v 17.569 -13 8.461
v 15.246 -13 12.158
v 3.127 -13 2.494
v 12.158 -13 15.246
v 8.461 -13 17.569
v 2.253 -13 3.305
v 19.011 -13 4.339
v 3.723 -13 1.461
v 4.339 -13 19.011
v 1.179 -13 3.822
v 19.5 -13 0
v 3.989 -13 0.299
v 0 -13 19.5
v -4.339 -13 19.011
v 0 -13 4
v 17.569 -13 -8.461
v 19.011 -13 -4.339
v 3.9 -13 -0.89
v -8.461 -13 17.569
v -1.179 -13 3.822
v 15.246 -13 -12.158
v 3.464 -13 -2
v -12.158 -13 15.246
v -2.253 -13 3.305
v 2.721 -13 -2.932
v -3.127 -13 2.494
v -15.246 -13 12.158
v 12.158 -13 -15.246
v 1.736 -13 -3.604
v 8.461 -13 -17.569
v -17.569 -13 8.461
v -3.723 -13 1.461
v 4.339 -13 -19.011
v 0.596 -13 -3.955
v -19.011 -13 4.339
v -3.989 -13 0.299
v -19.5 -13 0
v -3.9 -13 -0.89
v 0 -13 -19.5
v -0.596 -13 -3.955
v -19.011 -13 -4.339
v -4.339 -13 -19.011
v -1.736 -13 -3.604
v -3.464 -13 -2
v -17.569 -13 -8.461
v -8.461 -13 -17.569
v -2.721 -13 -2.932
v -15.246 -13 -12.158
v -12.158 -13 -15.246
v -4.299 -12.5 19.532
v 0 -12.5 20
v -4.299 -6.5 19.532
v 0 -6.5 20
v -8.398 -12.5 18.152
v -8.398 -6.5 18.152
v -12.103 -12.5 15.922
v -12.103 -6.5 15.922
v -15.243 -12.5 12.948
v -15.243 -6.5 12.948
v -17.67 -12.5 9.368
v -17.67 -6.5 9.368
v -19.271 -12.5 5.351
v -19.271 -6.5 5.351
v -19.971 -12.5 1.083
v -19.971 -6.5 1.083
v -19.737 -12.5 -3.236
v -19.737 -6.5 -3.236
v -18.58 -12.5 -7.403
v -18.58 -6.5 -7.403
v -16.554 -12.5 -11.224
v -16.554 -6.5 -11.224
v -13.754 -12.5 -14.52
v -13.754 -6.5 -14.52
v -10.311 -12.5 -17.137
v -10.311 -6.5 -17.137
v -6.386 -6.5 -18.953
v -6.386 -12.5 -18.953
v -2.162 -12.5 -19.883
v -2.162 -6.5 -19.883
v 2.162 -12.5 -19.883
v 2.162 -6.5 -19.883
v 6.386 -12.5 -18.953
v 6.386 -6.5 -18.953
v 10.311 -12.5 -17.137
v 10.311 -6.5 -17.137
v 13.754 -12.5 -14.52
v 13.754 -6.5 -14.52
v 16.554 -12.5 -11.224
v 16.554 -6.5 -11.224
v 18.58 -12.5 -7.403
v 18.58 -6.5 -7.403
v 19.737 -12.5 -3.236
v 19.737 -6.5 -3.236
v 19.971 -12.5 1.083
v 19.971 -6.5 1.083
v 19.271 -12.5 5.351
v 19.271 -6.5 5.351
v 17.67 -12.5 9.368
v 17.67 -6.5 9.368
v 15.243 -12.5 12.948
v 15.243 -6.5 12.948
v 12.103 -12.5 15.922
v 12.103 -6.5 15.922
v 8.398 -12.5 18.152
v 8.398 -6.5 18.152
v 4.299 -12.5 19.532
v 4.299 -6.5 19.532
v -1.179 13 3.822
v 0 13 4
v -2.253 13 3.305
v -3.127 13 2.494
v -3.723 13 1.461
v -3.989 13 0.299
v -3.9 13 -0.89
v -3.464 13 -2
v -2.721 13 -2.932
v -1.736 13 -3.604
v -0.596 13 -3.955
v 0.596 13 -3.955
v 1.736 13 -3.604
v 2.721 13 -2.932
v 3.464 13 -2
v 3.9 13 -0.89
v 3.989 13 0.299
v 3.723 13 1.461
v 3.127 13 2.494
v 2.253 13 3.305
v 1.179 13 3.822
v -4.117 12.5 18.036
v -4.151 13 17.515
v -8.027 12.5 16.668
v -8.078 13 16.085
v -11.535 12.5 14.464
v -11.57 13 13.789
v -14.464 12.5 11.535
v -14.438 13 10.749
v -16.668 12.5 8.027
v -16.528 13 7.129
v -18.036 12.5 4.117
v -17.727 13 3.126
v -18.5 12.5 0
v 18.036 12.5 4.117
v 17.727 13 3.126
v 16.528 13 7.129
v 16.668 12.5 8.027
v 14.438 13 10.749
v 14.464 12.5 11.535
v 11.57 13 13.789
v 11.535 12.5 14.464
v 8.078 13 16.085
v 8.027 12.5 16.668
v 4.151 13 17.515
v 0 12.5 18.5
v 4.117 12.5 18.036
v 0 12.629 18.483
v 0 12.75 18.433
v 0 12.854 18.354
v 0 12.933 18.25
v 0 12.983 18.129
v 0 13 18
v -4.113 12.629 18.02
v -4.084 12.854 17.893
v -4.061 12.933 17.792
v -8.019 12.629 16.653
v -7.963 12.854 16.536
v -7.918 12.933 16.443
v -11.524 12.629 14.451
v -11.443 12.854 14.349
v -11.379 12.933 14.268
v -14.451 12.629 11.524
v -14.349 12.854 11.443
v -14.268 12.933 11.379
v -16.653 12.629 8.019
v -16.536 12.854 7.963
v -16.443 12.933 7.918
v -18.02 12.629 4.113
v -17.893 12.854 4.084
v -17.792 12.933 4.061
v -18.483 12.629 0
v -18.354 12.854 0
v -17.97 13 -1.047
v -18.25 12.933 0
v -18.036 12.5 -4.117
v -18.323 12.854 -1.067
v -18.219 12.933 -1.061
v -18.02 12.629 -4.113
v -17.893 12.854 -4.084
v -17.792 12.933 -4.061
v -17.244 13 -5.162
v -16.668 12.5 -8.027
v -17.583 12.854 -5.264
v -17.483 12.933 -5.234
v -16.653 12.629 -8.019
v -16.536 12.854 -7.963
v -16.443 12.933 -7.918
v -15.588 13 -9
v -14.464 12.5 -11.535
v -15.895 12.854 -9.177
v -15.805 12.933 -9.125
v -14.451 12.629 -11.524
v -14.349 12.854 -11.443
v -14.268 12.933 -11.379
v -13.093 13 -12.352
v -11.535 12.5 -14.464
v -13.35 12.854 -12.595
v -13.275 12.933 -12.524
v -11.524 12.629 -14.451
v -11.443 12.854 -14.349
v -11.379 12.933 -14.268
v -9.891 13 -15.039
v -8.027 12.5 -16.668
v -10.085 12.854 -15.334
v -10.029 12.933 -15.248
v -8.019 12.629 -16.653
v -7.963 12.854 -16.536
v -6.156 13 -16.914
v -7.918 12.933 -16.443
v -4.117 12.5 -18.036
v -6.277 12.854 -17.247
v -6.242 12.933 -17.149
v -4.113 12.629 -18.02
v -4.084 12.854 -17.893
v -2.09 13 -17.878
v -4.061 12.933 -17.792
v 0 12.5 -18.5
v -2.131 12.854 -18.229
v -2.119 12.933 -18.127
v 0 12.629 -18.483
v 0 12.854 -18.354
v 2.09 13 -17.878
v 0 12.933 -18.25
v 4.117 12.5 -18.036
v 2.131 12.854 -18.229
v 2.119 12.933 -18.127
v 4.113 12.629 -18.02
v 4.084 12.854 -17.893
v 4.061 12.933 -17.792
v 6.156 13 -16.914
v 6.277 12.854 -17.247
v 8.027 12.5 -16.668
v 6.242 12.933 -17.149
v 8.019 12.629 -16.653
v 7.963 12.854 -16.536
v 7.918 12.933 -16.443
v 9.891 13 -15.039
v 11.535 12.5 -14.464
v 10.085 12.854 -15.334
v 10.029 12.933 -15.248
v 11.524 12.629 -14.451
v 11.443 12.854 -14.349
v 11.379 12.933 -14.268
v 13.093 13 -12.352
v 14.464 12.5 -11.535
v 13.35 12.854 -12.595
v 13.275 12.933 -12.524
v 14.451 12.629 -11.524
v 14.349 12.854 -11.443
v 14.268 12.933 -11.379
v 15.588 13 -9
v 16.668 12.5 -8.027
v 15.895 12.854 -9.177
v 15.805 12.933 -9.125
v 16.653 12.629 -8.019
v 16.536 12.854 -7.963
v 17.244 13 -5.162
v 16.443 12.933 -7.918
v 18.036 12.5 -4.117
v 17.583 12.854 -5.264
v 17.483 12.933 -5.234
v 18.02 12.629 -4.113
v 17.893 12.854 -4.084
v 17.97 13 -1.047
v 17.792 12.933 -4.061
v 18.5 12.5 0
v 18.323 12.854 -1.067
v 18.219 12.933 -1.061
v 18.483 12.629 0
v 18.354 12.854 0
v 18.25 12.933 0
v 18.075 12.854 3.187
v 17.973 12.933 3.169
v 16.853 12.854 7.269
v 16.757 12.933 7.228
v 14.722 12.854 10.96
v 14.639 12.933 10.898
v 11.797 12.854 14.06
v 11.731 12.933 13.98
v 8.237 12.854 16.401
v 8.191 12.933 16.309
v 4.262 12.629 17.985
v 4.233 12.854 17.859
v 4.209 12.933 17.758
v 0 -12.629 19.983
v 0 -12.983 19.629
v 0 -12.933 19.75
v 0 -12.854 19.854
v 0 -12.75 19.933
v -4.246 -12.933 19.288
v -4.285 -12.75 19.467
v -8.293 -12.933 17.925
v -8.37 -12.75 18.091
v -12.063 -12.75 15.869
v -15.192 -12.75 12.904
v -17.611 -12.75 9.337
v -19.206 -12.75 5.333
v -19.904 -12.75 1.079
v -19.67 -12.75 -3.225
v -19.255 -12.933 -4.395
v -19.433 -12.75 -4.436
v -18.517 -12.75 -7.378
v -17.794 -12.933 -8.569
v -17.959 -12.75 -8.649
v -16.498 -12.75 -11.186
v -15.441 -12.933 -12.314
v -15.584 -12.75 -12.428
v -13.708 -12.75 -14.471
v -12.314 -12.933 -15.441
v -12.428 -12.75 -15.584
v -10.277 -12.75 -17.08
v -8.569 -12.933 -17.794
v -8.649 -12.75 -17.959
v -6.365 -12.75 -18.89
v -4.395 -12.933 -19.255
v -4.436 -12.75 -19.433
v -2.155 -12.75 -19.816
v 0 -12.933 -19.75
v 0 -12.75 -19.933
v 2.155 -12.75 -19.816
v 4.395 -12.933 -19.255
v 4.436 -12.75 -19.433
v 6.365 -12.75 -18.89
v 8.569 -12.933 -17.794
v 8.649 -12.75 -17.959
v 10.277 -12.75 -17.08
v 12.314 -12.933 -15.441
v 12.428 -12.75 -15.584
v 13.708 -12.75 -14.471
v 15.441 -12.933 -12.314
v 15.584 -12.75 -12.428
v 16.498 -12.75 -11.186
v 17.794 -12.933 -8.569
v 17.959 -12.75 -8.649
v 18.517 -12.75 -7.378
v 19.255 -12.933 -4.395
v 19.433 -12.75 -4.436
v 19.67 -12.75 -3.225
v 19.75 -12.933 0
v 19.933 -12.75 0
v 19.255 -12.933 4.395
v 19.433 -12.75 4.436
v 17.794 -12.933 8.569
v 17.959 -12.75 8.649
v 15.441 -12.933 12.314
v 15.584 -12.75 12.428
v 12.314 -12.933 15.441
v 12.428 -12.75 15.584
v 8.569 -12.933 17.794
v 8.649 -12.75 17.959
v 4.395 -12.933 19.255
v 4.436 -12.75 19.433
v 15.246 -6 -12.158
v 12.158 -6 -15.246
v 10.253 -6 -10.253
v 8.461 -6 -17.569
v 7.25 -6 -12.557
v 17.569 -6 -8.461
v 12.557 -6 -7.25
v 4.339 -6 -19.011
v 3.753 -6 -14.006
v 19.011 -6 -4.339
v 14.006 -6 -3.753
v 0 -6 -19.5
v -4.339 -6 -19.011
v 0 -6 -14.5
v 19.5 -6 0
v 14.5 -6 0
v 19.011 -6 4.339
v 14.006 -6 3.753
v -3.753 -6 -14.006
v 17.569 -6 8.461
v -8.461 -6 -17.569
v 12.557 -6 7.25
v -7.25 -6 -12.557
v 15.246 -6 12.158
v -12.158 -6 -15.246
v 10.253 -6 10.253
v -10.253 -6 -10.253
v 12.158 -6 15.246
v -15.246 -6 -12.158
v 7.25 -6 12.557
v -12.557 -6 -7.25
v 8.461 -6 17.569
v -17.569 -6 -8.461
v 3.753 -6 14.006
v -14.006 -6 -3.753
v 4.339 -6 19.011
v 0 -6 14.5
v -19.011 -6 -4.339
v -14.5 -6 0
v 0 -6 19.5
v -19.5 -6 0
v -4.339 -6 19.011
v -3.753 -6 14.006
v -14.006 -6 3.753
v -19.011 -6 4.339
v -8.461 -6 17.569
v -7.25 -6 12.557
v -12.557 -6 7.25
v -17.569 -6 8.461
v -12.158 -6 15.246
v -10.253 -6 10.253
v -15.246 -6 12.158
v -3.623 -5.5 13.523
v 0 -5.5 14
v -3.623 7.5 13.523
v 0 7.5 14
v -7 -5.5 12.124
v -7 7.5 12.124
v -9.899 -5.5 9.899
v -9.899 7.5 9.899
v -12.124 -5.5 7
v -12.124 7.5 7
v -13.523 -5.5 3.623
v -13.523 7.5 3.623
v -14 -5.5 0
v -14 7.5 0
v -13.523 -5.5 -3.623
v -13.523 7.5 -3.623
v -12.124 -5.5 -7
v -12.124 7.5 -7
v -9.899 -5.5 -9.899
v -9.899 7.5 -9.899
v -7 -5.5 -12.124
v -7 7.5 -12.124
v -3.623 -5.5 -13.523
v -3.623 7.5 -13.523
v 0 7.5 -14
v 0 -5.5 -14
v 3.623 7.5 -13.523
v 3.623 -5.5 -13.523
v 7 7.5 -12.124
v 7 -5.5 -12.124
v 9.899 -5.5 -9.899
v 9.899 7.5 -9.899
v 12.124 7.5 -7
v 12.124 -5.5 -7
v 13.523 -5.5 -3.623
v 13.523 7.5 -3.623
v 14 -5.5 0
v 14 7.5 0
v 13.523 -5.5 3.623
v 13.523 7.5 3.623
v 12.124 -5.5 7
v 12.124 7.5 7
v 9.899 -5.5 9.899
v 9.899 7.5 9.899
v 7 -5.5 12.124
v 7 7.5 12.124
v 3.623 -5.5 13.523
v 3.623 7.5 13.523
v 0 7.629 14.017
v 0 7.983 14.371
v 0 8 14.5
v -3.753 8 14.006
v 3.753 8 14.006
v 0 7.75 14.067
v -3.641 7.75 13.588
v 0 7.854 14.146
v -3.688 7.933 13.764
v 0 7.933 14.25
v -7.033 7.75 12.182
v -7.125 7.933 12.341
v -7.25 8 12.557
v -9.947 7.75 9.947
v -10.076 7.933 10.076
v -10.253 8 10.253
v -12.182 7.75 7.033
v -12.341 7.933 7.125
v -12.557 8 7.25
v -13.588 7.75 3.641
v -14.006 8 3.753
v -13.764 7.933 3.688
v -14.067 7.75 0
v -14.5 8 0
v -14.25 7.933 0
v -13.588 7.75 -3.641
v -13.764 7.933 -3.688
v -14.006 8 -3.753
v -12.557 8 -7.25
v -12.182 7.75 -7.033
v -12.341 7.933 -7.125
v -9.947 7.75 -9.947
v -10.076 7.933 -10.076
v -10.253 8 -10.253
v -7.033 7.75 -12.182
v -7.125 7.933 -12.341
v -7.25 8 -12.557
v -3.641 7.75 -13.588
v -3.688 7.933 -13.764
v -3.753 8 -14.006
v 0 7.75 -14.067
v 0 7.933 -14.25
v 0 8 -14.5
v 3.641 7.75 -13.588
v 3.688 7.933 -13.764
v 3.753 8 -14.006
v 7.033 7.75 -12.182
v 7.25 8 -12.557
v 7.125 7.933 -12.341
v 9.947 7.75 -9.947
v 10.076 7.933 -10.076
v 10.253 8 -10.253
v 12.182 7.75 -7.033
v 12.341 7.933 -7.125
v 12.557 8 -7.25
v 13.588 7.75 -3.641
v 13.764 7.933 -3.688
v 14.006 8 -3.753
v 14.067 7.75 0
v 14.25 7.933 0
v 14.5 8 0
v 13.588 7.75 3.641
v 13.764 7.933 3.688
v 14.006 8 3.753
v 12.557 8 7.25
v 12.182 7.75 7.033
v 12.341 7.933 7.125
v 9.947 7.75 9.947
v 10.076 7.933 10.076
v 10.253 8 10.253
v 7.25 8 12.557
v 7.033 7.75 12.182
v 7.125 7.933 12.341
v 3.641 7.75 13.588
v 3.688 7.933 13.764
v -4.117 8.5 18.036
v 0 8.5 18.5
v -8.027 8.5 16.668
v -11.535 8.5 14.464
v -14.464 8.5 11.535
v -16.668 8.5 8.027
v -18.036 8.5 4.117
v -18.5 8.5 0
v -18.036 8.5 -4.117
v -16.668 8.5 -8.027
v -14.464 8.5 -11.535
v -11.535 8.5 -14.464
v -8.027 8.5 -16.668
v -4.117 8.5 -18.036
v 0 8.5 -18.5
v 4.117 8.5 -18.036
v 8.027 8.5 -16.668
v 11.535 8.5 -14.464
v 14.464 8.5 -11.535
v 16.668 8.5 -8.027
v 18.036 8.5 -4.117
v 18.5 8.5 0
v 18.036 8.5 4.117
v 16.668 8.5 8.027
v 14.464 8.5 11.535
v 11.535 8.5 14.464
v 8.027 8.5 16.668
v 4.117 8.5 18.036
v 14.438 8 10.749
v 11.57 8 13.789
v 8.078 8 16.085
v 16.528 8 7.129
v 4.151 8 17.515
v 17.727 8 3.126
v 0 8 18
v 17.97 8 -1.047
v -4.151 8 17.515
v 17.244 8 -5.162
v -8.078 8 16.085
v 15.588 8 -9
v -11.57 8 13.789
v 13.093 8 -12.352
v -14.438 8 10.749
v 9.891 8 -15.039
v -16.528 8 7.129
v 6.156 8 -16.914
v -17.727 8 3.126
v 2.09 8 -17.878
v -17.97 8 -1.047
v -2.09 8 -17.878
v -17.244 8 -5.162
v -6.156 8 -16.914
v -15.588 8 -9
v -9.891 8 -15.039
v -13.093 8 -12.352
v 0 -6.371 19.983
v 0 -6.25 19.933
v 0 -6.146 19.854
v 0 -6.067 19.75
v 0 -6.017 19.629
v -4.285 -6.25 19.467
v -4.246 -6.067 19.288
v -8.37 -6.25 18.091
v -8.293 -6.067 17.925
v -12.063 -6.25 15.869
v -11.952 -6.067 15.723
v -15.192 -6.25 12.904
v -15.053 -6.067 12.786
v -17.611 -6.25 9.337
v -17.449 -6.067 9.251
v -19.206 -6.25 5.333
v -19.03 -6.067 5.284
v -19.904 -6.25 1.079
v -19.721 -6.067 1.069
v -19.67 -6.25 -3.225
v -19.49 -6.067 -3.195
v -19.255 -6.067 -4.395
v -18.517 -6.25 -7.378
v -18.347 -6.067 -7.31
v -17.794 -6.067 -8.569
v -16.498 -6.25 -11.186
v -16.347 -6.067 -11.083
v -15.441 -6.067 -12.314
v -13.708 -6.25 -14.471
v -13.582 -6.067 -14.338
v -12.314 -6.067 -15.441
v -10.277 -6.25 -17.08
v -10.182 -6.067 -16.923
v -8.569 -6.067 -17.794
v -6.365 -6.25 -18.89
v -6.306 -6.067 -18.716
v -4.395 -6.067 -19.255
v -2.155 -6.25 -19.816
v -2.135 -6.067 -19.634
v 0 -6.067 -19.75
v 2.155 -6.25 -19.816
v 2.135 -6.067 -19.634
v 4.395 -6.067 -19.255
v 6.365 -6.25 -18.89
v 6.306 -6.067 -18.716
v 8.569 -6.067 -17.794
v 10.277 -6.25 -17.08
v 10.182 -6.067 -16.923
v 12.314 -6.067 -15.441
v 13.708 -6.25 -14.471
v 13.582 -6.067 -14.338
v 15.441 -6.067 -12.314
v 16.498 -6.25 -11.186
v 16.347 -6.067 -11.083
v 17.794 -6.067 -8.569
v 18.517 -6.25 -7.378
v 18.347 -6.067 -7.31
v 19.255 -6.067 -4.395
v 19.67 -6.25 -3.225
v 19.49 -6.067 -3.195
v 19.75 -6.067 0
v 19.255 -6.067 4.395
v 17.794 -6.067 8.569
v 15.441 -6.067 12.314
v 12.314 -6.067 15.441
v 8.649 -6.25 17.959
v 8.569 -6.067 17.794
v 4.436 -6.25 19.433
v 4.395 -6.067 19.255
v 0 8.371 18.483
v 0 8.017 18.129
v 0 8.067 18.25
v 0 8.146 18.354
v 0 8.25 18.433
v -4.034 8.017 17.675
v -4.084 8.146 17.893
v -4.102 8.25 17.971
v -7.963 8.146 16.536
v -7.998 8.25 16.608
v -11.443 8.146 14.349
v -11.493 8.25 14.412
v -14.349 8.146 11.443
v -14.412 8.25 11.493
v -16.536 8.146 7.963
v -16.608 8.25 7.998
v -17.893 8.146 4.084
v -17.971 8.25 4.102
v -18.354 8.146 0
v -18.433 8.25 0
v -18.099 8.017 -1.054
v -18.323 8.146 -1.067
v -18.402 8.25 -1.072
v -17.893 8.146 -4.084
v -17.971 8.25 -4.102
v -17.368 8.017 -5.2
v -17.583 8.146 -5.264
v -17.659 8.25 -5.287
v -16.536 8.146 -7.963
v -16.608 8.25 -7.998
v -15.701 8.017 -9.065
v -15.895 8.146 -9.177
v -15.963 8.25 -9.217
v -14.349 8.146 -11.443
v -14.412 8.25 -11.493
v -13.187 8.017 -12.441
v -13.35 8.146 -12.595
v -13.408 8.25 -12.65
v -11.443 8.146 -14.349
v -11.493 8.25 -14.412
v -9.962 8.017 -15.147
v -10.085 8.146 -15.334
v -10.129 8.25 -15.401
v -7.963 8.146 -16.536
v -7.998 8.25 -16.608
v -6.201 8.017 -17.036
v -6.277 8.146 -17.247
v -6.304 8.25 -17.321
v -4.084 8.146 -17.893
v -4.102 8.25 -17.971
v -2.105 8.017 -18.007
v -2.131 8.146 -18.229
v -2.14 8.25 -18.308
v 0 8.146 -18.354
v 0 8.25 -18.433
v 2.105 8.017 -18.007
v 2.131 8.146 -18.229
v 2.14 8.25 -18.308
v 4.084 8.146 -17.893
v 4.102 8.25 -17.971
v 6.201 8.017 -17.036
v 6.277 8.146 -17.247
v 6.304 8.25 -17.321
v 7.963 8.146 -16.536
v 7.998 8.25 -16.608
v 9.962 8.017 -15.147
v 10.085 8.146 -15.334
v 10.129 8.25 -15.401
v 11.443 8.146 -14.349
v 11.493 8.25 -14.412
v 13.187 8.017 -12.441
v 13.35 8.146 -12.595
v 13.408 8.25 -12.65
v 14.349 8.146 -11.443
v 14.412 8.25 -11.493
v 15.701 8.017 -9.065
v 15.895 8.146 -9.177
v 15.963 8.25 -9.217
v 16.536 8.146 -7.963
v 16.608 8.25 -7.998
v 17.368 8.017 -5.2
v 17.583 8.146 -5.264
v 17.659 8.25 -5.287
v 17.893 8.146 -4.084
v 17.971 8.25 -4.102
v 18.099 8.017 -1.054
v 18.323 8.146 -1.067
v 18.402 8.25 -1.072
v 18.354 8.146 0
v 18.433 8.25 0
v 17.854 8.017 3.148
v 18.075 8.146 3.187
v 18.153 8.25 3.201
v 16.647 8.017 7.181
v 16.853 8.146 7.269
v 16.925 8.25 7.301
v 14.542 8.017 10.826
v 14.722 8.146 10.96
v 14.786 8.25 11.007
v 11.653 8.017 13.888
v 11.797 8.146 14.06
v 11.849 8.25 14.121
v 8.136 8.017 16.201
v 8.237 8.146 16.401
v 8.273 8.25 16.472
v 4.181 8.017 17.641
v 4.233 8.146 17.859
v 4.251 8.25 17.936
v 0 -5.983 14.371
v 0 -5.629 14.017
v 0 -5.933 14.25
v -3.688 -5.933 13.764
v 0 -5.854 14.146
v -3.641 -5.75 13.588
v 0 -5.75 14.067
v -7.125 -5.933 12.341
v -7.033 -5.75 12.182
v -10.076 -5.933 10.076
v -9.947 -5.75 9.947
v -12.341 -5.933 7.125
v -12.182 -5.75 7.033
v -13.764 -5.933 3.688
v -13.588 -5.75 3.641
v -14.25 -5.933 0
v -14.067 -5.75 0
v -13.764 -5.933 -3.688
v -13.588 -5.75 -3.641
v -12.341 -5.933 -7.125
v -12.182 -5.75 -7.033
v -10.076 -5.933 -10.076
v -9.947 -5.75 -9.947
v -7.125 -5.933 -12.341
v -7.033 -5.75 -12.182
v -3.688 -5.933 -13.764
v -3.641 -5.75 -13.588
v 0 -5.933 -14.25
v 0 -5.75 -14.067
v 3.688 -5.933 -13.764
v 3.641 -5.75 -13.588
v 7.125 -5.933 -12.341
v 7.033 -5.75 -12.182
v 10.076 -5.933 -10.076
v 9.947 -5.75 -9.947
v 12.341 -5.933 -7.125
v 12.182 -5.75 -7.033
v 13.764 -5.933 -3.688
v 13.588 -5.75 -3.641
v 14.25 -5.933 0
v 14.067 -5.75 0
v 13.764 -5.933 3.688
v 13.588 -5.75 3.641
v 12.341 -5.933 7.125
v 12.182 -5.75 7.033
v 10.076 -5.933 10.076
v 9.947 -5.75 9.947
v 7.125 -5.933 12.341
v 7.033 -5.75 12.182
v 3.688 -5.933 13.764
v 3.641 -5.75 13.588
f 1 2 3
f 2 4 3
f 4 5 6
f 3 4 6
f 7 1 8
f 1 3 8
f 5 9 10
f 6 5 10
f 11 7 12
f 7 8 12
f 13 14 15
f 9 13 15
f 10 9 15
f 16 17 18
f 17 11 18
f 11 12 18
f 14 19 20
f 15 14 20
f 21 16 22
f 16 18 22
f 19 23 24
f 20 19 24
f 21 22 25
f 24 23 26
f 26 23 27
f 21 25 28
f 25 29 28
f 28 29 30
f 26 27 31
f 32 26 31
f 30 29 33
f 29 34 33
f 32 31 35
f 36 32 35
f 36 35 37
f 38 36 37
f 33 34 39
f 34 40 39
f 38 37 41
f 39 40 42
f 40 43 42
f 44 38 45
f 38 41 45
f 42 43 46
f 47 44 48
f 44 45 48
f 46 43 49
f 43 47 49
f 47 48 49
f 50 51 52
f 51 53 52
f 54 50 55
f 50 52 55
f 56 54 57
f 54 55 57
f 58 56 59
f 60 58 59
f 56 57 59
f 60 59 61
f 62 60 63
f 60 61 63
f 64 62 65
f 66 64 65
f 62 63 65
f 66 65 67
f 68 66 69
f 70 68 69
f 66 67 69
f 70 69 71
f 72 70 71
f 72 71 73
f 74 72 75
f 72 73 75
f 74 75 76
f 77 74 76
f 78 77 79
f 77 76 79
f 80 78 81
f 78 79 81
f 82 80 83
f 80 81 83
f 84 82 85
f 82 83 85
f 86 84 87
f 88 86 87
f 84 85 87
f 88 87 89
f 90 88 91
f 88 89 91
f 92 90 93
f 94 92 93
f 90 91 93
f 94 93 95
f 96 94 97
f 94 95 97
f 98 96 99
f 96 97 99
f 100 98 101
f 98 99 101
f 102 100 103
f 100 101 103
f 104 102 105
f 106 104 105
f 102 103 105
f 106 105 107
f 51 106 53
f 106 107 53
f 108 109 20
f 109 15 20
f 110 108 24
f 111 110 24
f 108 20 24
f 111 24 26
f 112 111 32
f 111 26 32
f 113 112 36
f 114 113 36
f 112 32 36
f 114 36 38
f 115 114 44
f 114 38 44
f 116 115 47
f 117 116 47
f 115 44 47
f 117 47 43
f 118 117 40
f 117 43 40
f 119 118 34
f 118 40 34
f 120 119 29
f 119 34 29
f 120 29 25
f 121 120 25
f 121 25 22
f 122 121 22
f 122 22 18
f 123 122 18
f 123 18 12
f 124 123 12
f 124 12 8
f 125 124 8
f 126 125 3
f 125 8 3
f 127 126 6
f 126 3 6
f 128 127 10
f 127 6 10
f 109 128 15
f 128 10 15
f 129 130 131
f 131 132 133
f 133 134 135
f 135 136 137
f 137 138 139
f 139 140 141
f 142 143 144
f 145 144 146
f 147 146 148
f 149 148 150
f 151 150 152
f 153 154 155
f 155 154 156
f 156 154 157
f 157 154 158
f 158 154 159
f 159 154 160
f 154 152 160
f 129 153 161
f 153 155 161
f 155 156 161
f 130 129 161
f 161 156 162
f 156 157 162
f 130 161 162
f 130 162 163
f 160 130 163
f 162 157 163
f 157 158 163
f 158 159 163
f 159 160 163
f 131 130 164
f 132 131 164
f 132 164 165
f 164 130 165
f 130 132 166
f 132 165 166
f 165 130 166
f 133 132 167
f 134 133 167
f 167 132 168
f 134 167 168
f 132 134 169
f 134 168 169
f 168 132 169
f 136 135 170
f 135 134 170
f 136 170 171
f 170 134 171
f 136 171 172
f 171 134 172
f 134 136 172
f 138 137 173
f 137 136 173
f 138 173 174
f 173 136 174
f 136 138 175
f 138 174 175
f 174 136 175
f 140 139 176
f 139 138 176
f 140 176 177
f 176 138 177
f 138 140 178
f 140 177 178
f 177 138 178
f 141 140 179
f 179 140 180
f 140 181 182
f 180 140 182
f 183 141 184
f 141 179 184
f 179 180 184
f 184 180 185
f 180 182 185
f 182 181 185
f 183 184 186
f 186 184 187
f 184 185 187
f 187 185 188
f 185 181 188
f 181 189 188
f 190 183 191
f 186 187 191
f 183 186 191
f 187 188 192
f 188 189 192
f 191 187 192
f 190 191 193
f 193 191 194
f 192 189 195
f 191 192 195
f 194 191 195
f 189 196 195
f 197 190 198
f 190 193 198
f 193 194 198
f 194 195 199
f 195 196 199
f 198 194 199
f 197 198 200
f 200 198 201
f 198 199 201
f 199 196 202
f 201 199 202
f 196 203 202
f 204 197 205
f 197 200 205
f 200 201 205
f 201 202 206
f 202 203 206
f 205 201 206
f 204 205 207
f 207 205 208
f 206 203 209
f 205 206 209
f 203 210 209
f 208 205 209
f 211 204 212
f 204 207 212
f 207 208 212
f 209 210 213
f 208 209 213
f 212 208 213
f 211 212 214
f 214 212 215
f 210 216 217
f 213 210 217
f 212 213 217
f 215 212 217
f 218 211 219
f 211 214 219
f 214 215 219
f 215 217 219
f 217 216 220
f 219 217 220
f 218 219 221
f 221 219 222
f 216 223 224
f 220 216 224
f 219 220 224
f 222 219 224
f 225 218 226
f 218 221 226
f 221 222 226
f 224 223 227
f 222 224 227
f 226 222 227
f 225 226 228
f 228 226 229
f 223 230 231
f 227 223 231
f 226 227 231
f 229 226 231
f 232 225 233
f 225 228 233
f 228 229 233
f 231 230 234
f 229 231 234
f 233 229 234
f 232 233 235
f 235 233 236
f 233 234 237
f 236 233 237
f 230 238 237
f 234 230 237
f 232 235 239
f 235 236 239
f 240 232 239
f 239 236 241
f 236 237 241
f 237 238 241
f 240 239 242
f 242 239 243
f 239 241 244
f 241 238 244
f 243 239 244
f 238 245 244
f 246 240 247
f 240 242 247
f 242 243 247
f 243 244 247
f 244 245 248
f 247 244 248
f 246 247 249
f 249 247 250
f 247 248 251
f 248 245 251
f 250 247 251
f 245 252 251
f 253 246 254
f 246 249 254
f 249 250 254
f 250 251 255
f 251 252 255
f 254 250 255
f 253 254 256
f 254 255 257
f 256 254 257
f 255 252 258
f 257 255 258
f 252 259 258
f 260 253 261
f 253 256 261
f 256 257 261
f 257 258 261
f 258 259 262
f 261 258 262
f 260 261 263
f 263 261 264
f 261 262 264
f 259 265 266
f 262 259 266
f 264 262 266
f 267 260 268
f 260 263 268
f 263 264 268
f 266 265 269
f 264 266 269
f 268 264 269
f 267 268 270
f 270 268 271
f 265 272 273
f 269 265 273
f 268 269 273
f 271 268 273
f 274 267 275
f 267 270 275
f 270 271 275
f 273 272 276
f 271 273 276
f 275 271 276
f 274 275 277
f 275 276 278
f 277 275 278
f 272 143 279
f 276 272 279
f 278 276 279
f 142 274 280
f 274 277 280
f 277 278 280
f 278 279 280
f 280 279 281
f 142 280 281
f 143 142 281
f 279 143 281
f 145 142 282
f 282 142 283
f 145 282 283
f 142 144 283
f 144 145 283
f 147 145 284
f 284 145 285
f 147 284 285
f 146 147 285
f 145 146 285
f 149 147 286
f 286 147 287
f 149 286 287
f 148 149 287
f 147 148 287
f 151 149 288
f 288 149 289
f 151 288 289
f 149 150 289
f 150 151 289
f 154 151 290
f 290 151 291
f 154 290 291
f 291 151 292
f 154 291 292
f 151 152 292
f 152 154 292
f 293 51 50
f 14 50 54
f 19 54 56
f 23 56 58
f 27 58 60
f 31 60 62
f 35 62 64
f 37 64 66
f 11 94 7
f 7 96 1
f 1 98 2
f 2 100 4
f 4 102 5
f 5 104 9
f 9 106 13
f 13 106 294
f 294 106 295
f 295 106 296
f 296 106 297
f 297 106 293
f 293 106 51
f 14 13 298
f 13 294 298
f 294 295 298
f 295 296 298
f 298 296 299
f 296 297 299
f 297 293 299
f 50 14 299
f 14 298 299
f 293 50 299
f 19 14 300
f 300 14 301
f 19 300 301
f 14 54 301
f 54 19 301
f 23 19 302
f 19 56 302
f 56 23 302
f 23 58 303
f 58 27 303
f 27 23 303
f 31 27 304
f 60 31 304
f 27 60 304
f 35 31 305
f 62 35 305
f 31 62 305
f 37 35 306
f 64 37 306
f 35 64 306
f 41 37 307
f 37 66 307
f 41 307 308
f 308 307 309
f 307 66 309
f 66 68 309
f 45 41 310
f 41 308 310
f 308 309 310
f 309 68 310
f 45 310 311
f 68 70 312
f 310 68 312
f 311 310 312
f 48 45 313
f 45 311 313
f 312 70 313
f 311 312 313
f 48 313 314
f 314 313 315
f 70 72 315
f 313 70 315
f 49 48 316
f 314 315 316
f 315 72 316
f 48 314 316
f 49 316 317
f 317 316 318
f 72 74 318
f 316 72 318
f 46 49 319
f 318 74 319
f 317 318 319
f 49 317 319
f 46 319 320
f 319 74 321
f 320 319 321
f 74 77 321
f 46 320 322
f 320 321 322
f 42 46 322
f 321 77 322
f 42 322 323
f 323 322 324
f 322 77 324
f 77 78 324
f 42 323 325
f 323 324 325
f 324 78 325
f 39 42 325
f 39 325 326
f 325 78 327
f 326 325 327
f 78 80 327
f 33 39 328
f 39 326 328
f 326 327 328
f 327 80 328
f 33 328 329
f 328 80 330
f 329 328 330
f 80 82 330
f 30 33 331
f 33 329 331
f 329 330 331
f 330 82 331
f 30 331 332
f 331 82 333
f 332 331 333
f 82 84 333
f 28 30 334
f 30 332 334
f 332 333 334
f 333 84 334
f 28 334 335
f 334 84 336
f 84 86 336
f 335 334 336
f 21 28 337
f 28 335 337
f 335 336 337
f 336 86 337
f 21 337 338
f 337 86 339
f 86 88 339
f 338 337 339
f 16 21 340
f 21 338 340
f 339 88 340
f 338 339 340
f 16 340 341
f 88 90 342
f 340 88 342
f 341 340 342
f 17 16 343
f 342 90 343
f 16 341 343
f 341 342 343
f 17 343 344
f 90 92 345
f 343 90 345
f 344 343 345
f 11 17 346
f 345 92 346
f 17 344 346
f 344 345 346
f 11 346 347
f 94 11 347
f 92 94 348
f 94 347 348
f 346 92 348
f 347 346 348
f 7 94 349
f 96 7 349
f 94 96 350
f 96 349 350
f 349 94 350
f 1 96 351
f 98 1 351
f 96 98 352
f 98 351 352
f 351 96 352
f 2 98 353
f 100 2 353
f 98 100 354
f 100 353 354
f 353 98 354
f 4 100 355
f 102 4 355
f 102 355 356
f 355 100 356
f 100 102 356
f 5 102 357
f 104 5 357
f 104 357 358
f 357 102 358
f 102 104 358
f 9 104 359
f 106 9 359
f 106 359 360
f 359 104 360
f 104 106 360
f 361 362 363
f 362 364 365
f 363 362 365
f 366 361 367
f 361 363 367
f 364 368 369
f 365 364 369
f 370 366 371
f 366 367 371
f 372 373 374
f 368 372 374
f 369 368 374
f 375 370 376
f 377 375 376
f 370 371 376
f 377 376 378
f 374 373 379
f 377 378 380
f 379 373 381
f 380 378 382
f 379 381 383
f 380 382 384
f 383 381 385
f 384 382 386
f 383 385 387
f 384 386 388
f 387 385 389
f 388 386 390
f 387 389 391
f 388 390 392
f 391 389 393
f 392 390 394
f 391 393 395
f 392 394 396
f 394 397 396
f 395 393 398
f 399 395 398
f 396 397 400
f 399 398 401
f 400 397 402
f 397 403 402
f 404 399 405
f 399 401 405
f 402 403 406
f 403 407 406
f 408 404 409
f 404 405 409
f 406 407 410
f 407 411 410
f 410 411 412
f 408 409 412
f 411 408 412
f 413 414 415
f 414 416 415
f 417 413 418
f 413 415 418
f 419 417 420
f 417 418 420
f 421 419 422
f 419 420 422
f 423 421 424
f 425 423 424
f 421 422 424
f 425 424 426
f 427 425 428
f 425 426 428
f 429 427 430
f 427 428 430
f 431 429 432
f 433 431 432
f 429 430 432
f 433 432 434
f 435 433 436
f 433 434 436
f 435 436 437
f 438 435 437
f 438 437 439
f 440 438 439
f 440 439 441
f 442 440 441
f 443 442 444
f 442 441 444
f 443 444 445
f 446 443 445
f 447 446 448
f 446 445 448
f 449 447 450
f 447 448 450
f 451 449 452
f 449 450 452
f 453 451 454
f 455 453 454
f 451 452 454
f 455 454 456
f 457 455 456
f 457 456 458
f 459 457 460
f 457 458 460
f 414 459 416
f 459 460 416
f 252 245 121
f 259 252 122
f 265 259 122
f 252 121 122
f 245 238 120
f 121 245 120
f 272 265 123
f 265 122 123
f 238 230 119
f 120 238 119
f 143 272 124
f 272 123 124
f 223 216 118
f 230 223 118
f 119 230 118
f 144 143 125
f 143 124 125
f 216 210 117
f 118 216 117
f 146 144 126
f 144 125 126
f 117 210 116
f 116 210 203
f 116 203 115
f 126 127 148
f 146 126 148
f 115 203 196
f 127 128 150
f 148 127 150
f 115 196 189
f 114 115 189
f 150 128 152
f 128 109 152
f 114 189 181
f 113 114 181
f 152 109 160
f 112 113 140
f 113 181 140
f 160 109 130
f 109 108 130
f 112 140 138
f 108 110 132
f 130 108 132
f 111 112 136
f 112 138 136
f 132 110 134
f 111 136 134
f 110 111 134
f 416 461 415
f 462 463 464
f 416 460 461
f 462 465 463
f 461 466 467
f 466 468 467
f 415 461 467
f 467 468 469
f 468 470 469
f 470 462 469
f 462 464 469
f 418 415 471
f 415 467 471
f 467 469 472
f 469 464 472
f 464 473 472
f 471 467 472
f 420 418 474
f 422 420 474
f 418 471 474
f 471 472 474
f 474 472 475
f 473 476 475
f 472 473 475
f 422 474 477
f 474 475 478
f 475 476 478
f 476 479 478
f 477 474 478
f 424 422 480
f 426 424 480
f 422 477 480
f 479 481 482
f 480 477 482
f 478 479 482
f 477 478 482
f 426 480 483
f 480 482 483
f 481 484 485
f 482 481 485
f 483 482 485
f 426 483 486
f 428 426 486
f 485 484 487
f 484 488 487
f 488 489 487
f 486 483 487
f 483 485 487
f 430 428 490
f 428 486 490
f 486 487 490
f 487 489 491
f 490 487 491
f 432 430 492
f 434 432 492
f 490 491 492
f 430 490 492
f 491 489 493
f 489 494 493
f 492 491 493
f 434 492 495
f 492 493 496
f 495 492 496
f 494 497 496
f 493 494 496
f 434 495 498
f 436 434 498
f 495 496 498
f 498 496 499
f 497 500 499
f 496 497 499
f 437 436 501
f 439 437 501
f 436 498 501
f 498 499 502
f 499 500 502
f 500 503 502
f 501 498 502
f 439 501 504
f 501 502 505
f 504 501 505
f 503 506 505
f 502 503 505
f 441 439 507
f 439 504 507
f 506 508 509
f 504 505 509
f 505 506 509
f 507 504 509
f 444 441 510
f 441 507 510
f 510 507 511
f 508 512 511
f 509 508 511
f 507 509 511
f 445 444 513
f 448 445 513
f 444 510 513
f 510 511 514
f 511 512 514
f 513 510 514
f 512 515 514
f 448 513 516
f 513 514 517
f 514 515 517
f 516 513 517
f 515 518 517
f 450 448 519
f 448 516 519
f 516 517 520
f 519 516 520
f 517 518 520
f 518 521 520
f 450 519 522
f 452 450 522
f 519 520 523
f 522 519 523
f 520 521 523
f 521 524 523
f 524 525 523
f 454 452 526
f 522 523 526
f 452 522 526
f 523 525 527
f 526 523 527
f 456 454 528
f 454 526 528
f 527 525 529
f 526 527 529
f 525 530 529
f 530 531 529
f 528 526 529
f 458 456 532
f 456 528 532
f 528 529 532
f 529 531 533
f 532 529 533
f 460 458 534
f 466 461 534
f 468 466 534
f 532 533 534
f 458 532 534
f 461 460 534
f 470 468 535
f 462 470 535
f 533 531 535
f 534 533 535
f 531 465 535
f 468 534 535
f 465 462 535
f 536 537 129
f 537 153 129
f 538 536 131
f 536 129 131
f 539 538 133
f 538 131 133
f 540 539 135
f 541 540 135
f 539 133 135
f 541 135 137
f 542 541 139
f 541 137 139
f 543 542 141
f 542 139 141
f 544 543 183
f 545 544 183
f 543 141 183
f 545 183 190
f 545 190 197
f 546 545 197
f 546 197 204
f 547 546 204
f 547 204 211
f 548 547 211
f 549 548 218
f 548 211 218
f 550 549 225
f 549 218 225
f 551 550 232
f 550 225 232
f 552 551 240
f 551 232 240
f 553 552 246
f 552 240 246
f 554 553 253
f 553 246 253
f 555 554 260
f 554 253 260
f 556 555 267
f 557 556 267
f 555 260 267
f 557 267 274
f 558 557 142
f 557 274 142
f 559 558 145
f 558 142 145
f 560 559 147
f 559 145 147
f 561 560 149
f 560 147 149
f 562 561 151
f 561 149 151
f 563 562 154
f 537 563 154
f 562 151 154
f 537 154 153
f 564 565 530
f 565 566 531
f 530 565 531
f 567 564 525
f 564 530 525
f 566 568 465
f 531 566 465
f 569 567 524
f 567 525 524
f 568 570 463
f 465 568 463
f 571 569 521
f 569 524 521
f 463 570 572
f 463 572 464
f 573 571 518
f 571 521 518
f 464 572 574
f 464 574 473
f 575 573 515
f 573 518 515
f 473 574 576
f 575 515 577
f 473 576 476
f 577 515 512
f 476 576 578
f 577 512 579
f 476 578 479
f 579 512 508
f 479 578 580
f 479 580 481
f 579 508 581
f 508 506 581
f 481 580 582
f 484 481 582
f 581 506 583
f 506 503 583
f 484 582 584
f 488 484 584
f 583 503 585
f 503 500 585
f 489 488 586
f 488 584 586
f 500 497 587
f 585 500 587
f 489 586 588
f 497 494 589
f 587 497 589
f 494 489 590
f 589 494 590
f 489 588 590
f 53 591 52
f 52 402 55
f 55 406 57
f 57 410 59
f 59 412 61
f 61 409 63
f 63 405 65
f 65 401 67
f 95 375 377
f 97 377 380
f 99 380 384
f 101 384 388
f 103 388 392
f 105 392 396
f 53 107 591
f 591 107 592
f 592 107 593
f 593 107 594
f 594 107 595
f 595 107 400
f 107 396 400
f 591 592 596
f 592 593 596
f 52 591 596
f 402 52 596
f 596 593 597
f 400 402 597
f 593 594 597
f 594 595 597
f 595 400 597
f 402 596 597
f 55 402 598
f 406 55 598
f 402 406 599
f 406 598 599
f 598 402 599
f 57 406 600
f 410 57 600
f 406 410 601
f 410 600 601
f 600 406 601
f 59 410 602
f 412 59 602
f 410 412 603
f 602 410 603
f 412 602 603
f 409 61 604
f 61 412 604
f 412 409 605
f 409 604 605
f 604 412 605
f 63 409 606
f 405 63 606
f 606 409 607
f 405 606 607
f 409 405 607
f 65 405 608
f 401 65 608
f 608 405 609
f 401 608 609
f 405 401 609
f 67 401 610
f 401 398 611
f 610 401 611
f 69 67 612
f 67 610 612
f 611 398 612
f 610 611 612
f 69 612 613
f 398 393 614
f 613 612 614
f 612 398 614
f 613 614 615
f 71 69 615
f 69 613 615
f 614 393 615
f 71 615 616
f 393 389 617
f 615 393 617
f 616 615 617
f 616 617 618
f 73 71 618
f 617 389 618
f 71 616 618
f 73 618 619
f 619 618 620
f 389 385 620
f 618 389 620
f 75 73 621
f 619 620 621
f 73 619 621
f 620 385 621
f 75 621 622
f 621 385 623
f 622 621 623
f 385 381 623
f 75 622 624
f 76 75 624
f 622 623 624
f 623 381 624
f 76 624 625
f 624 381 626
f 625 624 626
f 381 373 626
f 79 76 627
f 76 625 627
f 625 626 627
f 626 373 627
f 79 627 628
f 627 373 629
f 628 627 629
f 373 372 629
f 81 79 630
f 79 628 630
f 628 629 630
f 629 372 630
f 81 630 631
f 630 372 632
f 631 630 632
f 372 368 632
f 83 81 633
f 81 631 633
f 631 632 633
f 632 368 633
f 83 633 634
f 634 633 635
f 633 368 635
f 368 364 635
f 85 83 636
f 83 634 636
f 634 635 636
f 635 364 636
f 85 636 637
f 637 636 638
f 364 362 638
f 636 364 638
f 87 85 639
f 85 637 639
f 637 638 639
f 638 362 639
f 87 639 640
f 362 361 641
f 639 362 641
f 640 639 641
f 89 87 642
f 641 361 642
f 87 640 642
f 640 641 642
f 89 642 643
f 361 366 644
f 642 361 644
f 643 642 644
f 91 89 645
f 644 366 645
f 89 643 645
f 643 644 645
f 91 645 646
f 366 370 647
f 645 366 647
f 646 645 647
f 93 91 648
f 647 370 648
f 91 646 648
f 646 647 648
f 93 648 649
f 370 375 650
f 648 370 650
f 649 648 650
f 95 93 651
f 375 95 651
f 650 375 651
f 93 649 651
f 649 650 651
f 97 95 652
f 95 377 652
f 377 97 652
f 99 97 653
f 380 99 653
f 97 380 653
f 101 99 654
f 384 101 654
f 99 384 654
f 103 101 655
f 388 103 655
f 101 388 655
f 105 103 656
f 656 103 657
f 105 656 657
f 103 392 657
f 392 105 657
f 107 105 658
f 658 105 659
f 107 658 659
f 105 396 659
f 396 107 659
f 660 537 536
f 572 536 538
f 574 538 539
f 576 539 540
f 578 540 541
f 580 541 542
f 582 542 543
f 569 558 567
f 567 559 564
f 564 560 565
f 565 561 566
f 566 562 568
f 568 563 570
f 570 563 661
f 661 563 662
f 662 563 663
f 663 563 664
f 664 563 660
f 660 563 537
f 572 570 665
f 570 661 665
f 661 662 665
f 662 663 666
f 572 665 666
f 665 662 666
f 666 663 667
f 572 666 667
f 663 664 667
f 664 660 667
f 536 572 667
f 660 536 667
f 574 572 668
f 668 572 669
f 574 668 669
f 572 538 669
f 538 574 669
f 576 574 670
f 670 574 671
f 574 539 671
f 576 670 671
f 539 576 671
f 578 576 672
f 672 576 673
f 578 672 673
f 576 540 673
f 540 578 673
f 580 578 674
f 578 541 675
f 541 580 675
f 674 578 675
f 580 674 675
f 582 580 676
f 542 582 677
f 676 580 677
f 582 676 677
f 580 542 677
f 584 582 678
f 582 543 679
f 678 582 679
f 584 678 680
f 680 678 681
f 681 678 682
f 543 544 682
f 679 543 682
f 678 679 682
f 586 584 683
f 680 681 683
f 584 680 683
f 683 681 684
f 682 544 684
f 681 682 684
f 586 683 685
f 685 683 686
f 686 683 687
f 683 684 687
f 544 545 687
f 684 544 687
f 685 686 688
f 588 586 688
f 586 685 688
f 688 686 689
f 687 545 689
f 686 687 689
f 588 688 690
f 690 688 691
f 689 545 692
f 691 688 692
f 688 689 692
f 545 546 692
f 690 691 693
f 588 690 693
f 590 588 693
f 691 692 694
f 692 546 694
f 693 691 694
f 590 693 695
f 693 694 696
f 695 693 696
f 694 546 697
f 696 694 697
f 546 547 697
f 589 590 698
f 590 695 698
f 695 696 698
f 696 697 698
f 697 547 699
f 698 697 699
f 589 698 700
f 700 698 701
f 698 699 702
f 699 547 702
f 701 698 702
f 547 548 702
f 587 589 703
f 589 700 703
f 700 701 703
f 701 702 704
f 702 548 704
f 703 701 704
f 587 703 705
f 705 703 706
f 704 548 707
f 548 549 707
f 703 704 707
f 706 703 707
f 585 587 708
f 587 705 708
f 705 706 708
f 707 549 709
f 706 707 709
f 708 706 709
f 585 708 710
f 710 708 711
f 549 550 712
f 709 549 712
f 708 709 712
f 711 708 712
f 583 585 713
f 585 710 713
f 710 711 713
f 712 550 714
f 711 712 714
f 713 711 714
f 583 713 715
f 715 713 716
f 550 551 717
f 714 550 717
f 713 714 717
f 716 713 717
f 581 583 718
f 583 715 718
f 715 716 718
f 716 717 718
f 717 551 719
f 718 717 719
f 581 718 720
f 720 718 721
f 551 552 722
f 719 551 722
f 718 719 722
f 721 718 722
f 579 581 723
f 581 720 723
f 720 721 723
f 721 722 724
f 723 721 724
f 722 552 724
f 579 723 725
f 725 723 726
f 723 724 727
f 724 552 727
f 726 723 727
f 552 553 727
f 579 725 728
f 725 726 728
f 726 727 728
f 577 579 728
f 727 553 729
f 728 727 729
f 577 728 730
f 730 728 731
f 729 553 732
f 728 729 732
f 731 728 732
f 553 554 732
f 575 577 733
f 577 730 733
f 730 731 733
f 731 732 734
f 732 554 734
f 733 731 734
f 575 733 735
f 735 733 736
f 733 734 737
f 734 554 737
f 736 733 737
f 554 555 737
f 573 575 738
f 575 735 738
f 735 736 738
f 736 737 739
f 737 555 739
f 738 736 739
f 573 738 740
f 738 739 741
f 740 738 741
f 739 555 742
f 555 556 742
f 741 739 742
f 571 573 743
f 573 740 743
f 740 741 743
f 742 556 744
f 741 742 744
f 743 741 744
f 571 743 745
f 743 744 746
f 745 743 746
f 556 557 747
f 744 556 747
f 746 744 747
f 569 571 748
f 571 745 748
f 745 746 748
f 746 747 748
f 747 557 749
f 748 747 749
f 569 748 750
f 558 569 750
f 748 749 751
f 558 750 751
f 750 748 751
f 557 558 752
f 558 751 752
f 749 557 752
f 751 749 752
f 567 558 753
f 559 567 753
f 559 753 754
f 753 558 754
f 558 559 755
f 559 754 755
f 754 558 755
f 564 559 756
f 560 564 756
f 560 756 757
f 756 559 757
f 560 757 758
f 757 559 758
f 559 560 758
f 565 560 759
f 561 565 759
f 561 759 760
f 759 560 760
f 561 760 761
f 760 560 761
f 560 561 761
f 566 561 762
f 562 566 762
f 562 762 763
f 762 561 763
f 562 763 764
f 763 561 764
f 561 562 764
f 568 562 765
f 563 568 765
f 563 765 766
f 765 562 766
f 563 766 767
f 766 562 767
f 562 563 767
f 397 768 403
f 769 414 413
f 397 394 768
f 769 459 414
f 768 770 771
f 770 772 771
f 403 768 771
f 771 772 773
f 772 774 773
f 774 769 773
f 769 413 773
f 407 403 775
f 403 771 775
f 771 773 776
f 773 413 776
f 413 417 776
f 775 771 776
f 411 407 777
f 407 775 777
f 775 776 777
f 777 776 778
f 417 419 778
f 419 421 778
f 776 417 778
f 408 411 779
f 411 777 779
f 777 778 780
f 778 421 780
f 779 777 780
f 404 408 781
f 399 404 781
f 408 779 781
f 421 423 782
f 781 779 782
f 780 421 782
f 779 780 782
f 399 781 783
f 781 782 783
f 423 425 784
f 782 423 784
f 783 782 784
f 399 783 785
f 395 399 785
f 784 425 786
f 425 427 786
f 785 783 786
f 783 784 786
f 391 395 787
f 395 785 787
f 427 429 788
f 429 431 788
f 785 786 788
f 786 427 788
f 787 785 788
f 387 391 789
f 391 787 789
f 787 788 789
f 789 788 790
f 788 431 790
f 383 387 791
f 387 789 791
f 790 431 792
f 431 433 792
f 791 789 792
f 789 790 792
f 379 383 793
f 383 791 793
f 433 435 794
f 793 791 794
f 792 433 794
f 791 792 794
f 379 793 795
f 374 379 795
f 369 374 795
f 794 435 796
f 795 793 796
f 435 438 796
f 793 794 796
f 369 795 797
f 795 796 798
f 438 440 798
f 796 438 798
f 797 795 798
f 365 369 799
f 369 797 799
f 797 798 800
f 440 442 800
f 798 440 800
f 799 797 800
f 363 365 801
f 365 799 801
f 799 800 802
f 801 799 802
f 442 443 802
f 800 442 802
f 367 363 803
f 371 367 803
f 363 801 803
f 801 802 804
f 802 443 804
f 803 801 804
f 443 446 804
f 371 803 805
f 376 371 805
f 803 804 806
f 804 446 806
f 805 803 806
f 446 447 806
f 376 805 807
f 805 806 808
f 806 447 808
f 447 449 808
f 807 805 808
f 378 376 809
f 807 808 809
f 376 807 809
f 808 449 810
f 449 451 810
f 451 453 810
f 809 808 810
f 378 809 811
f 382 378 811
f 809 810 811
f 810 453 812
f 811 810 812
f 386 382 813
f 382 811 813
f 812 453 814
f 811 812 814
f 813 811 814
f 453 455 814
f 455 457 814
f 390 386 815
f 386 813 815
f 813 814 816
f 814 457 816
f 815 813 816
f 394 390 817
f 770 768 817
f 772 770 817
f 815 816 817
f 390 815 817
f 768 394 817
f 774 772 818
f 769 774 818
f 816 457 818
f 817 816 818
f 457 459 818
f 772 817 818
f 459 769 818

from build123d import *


with BuildPart() as part:
    # Sketch2 → Revolve1 (revolve)
    with BuildSketch(Plane(origin=(0, 0, 0), x_dir=(0, 0, -1), z_dir=(1, 0, 0)), mode=Mode.PRIVATE) as revolve1_sk:
        with BuildLine():
            Line((4, -13), (19.5, -13))
            ThreePointArc((19.5, -13), (19.853553391, -12.853553391), (20, -12.5))
            Line((20, -12.5), (20, -6.5))
            ThreePointArc((20, -6.5), (19.853553391, -6.146446609), (19.5, -6))
            Line((19.5, -6), (14.5, -6))
            ThreePointArc((14.5, -6), (14.146446609, -5.853553391), (14, -5.5))
            Line((14, -5.5), (14, 7.5))
            ThreePointArc((14, 7.5), (14.146446609, 7.853553391), (14.5, 8))
            Line((14.5, 8), (18, 8))
            ThreePointArc((18, 8), (18.353553391, 8.146446609), (18.5, 8.5))
            Line((18.5, 8.5), (18.5, 12.5))
            ThreePointArc((18.5, 12.5), (18.353553391, 12.853553391), (18, 13))
            Line((18, 13), (4, 13))
            Line((4, 13), (4, -13))
        make_face()
    revolve(revolve1_sk.sketch.rotate(Axis((0, 13, 0), (0, -1, 0)), 180), axis=Axis((0, 13, 0), (0, -1, 0)))


solid = part.part
